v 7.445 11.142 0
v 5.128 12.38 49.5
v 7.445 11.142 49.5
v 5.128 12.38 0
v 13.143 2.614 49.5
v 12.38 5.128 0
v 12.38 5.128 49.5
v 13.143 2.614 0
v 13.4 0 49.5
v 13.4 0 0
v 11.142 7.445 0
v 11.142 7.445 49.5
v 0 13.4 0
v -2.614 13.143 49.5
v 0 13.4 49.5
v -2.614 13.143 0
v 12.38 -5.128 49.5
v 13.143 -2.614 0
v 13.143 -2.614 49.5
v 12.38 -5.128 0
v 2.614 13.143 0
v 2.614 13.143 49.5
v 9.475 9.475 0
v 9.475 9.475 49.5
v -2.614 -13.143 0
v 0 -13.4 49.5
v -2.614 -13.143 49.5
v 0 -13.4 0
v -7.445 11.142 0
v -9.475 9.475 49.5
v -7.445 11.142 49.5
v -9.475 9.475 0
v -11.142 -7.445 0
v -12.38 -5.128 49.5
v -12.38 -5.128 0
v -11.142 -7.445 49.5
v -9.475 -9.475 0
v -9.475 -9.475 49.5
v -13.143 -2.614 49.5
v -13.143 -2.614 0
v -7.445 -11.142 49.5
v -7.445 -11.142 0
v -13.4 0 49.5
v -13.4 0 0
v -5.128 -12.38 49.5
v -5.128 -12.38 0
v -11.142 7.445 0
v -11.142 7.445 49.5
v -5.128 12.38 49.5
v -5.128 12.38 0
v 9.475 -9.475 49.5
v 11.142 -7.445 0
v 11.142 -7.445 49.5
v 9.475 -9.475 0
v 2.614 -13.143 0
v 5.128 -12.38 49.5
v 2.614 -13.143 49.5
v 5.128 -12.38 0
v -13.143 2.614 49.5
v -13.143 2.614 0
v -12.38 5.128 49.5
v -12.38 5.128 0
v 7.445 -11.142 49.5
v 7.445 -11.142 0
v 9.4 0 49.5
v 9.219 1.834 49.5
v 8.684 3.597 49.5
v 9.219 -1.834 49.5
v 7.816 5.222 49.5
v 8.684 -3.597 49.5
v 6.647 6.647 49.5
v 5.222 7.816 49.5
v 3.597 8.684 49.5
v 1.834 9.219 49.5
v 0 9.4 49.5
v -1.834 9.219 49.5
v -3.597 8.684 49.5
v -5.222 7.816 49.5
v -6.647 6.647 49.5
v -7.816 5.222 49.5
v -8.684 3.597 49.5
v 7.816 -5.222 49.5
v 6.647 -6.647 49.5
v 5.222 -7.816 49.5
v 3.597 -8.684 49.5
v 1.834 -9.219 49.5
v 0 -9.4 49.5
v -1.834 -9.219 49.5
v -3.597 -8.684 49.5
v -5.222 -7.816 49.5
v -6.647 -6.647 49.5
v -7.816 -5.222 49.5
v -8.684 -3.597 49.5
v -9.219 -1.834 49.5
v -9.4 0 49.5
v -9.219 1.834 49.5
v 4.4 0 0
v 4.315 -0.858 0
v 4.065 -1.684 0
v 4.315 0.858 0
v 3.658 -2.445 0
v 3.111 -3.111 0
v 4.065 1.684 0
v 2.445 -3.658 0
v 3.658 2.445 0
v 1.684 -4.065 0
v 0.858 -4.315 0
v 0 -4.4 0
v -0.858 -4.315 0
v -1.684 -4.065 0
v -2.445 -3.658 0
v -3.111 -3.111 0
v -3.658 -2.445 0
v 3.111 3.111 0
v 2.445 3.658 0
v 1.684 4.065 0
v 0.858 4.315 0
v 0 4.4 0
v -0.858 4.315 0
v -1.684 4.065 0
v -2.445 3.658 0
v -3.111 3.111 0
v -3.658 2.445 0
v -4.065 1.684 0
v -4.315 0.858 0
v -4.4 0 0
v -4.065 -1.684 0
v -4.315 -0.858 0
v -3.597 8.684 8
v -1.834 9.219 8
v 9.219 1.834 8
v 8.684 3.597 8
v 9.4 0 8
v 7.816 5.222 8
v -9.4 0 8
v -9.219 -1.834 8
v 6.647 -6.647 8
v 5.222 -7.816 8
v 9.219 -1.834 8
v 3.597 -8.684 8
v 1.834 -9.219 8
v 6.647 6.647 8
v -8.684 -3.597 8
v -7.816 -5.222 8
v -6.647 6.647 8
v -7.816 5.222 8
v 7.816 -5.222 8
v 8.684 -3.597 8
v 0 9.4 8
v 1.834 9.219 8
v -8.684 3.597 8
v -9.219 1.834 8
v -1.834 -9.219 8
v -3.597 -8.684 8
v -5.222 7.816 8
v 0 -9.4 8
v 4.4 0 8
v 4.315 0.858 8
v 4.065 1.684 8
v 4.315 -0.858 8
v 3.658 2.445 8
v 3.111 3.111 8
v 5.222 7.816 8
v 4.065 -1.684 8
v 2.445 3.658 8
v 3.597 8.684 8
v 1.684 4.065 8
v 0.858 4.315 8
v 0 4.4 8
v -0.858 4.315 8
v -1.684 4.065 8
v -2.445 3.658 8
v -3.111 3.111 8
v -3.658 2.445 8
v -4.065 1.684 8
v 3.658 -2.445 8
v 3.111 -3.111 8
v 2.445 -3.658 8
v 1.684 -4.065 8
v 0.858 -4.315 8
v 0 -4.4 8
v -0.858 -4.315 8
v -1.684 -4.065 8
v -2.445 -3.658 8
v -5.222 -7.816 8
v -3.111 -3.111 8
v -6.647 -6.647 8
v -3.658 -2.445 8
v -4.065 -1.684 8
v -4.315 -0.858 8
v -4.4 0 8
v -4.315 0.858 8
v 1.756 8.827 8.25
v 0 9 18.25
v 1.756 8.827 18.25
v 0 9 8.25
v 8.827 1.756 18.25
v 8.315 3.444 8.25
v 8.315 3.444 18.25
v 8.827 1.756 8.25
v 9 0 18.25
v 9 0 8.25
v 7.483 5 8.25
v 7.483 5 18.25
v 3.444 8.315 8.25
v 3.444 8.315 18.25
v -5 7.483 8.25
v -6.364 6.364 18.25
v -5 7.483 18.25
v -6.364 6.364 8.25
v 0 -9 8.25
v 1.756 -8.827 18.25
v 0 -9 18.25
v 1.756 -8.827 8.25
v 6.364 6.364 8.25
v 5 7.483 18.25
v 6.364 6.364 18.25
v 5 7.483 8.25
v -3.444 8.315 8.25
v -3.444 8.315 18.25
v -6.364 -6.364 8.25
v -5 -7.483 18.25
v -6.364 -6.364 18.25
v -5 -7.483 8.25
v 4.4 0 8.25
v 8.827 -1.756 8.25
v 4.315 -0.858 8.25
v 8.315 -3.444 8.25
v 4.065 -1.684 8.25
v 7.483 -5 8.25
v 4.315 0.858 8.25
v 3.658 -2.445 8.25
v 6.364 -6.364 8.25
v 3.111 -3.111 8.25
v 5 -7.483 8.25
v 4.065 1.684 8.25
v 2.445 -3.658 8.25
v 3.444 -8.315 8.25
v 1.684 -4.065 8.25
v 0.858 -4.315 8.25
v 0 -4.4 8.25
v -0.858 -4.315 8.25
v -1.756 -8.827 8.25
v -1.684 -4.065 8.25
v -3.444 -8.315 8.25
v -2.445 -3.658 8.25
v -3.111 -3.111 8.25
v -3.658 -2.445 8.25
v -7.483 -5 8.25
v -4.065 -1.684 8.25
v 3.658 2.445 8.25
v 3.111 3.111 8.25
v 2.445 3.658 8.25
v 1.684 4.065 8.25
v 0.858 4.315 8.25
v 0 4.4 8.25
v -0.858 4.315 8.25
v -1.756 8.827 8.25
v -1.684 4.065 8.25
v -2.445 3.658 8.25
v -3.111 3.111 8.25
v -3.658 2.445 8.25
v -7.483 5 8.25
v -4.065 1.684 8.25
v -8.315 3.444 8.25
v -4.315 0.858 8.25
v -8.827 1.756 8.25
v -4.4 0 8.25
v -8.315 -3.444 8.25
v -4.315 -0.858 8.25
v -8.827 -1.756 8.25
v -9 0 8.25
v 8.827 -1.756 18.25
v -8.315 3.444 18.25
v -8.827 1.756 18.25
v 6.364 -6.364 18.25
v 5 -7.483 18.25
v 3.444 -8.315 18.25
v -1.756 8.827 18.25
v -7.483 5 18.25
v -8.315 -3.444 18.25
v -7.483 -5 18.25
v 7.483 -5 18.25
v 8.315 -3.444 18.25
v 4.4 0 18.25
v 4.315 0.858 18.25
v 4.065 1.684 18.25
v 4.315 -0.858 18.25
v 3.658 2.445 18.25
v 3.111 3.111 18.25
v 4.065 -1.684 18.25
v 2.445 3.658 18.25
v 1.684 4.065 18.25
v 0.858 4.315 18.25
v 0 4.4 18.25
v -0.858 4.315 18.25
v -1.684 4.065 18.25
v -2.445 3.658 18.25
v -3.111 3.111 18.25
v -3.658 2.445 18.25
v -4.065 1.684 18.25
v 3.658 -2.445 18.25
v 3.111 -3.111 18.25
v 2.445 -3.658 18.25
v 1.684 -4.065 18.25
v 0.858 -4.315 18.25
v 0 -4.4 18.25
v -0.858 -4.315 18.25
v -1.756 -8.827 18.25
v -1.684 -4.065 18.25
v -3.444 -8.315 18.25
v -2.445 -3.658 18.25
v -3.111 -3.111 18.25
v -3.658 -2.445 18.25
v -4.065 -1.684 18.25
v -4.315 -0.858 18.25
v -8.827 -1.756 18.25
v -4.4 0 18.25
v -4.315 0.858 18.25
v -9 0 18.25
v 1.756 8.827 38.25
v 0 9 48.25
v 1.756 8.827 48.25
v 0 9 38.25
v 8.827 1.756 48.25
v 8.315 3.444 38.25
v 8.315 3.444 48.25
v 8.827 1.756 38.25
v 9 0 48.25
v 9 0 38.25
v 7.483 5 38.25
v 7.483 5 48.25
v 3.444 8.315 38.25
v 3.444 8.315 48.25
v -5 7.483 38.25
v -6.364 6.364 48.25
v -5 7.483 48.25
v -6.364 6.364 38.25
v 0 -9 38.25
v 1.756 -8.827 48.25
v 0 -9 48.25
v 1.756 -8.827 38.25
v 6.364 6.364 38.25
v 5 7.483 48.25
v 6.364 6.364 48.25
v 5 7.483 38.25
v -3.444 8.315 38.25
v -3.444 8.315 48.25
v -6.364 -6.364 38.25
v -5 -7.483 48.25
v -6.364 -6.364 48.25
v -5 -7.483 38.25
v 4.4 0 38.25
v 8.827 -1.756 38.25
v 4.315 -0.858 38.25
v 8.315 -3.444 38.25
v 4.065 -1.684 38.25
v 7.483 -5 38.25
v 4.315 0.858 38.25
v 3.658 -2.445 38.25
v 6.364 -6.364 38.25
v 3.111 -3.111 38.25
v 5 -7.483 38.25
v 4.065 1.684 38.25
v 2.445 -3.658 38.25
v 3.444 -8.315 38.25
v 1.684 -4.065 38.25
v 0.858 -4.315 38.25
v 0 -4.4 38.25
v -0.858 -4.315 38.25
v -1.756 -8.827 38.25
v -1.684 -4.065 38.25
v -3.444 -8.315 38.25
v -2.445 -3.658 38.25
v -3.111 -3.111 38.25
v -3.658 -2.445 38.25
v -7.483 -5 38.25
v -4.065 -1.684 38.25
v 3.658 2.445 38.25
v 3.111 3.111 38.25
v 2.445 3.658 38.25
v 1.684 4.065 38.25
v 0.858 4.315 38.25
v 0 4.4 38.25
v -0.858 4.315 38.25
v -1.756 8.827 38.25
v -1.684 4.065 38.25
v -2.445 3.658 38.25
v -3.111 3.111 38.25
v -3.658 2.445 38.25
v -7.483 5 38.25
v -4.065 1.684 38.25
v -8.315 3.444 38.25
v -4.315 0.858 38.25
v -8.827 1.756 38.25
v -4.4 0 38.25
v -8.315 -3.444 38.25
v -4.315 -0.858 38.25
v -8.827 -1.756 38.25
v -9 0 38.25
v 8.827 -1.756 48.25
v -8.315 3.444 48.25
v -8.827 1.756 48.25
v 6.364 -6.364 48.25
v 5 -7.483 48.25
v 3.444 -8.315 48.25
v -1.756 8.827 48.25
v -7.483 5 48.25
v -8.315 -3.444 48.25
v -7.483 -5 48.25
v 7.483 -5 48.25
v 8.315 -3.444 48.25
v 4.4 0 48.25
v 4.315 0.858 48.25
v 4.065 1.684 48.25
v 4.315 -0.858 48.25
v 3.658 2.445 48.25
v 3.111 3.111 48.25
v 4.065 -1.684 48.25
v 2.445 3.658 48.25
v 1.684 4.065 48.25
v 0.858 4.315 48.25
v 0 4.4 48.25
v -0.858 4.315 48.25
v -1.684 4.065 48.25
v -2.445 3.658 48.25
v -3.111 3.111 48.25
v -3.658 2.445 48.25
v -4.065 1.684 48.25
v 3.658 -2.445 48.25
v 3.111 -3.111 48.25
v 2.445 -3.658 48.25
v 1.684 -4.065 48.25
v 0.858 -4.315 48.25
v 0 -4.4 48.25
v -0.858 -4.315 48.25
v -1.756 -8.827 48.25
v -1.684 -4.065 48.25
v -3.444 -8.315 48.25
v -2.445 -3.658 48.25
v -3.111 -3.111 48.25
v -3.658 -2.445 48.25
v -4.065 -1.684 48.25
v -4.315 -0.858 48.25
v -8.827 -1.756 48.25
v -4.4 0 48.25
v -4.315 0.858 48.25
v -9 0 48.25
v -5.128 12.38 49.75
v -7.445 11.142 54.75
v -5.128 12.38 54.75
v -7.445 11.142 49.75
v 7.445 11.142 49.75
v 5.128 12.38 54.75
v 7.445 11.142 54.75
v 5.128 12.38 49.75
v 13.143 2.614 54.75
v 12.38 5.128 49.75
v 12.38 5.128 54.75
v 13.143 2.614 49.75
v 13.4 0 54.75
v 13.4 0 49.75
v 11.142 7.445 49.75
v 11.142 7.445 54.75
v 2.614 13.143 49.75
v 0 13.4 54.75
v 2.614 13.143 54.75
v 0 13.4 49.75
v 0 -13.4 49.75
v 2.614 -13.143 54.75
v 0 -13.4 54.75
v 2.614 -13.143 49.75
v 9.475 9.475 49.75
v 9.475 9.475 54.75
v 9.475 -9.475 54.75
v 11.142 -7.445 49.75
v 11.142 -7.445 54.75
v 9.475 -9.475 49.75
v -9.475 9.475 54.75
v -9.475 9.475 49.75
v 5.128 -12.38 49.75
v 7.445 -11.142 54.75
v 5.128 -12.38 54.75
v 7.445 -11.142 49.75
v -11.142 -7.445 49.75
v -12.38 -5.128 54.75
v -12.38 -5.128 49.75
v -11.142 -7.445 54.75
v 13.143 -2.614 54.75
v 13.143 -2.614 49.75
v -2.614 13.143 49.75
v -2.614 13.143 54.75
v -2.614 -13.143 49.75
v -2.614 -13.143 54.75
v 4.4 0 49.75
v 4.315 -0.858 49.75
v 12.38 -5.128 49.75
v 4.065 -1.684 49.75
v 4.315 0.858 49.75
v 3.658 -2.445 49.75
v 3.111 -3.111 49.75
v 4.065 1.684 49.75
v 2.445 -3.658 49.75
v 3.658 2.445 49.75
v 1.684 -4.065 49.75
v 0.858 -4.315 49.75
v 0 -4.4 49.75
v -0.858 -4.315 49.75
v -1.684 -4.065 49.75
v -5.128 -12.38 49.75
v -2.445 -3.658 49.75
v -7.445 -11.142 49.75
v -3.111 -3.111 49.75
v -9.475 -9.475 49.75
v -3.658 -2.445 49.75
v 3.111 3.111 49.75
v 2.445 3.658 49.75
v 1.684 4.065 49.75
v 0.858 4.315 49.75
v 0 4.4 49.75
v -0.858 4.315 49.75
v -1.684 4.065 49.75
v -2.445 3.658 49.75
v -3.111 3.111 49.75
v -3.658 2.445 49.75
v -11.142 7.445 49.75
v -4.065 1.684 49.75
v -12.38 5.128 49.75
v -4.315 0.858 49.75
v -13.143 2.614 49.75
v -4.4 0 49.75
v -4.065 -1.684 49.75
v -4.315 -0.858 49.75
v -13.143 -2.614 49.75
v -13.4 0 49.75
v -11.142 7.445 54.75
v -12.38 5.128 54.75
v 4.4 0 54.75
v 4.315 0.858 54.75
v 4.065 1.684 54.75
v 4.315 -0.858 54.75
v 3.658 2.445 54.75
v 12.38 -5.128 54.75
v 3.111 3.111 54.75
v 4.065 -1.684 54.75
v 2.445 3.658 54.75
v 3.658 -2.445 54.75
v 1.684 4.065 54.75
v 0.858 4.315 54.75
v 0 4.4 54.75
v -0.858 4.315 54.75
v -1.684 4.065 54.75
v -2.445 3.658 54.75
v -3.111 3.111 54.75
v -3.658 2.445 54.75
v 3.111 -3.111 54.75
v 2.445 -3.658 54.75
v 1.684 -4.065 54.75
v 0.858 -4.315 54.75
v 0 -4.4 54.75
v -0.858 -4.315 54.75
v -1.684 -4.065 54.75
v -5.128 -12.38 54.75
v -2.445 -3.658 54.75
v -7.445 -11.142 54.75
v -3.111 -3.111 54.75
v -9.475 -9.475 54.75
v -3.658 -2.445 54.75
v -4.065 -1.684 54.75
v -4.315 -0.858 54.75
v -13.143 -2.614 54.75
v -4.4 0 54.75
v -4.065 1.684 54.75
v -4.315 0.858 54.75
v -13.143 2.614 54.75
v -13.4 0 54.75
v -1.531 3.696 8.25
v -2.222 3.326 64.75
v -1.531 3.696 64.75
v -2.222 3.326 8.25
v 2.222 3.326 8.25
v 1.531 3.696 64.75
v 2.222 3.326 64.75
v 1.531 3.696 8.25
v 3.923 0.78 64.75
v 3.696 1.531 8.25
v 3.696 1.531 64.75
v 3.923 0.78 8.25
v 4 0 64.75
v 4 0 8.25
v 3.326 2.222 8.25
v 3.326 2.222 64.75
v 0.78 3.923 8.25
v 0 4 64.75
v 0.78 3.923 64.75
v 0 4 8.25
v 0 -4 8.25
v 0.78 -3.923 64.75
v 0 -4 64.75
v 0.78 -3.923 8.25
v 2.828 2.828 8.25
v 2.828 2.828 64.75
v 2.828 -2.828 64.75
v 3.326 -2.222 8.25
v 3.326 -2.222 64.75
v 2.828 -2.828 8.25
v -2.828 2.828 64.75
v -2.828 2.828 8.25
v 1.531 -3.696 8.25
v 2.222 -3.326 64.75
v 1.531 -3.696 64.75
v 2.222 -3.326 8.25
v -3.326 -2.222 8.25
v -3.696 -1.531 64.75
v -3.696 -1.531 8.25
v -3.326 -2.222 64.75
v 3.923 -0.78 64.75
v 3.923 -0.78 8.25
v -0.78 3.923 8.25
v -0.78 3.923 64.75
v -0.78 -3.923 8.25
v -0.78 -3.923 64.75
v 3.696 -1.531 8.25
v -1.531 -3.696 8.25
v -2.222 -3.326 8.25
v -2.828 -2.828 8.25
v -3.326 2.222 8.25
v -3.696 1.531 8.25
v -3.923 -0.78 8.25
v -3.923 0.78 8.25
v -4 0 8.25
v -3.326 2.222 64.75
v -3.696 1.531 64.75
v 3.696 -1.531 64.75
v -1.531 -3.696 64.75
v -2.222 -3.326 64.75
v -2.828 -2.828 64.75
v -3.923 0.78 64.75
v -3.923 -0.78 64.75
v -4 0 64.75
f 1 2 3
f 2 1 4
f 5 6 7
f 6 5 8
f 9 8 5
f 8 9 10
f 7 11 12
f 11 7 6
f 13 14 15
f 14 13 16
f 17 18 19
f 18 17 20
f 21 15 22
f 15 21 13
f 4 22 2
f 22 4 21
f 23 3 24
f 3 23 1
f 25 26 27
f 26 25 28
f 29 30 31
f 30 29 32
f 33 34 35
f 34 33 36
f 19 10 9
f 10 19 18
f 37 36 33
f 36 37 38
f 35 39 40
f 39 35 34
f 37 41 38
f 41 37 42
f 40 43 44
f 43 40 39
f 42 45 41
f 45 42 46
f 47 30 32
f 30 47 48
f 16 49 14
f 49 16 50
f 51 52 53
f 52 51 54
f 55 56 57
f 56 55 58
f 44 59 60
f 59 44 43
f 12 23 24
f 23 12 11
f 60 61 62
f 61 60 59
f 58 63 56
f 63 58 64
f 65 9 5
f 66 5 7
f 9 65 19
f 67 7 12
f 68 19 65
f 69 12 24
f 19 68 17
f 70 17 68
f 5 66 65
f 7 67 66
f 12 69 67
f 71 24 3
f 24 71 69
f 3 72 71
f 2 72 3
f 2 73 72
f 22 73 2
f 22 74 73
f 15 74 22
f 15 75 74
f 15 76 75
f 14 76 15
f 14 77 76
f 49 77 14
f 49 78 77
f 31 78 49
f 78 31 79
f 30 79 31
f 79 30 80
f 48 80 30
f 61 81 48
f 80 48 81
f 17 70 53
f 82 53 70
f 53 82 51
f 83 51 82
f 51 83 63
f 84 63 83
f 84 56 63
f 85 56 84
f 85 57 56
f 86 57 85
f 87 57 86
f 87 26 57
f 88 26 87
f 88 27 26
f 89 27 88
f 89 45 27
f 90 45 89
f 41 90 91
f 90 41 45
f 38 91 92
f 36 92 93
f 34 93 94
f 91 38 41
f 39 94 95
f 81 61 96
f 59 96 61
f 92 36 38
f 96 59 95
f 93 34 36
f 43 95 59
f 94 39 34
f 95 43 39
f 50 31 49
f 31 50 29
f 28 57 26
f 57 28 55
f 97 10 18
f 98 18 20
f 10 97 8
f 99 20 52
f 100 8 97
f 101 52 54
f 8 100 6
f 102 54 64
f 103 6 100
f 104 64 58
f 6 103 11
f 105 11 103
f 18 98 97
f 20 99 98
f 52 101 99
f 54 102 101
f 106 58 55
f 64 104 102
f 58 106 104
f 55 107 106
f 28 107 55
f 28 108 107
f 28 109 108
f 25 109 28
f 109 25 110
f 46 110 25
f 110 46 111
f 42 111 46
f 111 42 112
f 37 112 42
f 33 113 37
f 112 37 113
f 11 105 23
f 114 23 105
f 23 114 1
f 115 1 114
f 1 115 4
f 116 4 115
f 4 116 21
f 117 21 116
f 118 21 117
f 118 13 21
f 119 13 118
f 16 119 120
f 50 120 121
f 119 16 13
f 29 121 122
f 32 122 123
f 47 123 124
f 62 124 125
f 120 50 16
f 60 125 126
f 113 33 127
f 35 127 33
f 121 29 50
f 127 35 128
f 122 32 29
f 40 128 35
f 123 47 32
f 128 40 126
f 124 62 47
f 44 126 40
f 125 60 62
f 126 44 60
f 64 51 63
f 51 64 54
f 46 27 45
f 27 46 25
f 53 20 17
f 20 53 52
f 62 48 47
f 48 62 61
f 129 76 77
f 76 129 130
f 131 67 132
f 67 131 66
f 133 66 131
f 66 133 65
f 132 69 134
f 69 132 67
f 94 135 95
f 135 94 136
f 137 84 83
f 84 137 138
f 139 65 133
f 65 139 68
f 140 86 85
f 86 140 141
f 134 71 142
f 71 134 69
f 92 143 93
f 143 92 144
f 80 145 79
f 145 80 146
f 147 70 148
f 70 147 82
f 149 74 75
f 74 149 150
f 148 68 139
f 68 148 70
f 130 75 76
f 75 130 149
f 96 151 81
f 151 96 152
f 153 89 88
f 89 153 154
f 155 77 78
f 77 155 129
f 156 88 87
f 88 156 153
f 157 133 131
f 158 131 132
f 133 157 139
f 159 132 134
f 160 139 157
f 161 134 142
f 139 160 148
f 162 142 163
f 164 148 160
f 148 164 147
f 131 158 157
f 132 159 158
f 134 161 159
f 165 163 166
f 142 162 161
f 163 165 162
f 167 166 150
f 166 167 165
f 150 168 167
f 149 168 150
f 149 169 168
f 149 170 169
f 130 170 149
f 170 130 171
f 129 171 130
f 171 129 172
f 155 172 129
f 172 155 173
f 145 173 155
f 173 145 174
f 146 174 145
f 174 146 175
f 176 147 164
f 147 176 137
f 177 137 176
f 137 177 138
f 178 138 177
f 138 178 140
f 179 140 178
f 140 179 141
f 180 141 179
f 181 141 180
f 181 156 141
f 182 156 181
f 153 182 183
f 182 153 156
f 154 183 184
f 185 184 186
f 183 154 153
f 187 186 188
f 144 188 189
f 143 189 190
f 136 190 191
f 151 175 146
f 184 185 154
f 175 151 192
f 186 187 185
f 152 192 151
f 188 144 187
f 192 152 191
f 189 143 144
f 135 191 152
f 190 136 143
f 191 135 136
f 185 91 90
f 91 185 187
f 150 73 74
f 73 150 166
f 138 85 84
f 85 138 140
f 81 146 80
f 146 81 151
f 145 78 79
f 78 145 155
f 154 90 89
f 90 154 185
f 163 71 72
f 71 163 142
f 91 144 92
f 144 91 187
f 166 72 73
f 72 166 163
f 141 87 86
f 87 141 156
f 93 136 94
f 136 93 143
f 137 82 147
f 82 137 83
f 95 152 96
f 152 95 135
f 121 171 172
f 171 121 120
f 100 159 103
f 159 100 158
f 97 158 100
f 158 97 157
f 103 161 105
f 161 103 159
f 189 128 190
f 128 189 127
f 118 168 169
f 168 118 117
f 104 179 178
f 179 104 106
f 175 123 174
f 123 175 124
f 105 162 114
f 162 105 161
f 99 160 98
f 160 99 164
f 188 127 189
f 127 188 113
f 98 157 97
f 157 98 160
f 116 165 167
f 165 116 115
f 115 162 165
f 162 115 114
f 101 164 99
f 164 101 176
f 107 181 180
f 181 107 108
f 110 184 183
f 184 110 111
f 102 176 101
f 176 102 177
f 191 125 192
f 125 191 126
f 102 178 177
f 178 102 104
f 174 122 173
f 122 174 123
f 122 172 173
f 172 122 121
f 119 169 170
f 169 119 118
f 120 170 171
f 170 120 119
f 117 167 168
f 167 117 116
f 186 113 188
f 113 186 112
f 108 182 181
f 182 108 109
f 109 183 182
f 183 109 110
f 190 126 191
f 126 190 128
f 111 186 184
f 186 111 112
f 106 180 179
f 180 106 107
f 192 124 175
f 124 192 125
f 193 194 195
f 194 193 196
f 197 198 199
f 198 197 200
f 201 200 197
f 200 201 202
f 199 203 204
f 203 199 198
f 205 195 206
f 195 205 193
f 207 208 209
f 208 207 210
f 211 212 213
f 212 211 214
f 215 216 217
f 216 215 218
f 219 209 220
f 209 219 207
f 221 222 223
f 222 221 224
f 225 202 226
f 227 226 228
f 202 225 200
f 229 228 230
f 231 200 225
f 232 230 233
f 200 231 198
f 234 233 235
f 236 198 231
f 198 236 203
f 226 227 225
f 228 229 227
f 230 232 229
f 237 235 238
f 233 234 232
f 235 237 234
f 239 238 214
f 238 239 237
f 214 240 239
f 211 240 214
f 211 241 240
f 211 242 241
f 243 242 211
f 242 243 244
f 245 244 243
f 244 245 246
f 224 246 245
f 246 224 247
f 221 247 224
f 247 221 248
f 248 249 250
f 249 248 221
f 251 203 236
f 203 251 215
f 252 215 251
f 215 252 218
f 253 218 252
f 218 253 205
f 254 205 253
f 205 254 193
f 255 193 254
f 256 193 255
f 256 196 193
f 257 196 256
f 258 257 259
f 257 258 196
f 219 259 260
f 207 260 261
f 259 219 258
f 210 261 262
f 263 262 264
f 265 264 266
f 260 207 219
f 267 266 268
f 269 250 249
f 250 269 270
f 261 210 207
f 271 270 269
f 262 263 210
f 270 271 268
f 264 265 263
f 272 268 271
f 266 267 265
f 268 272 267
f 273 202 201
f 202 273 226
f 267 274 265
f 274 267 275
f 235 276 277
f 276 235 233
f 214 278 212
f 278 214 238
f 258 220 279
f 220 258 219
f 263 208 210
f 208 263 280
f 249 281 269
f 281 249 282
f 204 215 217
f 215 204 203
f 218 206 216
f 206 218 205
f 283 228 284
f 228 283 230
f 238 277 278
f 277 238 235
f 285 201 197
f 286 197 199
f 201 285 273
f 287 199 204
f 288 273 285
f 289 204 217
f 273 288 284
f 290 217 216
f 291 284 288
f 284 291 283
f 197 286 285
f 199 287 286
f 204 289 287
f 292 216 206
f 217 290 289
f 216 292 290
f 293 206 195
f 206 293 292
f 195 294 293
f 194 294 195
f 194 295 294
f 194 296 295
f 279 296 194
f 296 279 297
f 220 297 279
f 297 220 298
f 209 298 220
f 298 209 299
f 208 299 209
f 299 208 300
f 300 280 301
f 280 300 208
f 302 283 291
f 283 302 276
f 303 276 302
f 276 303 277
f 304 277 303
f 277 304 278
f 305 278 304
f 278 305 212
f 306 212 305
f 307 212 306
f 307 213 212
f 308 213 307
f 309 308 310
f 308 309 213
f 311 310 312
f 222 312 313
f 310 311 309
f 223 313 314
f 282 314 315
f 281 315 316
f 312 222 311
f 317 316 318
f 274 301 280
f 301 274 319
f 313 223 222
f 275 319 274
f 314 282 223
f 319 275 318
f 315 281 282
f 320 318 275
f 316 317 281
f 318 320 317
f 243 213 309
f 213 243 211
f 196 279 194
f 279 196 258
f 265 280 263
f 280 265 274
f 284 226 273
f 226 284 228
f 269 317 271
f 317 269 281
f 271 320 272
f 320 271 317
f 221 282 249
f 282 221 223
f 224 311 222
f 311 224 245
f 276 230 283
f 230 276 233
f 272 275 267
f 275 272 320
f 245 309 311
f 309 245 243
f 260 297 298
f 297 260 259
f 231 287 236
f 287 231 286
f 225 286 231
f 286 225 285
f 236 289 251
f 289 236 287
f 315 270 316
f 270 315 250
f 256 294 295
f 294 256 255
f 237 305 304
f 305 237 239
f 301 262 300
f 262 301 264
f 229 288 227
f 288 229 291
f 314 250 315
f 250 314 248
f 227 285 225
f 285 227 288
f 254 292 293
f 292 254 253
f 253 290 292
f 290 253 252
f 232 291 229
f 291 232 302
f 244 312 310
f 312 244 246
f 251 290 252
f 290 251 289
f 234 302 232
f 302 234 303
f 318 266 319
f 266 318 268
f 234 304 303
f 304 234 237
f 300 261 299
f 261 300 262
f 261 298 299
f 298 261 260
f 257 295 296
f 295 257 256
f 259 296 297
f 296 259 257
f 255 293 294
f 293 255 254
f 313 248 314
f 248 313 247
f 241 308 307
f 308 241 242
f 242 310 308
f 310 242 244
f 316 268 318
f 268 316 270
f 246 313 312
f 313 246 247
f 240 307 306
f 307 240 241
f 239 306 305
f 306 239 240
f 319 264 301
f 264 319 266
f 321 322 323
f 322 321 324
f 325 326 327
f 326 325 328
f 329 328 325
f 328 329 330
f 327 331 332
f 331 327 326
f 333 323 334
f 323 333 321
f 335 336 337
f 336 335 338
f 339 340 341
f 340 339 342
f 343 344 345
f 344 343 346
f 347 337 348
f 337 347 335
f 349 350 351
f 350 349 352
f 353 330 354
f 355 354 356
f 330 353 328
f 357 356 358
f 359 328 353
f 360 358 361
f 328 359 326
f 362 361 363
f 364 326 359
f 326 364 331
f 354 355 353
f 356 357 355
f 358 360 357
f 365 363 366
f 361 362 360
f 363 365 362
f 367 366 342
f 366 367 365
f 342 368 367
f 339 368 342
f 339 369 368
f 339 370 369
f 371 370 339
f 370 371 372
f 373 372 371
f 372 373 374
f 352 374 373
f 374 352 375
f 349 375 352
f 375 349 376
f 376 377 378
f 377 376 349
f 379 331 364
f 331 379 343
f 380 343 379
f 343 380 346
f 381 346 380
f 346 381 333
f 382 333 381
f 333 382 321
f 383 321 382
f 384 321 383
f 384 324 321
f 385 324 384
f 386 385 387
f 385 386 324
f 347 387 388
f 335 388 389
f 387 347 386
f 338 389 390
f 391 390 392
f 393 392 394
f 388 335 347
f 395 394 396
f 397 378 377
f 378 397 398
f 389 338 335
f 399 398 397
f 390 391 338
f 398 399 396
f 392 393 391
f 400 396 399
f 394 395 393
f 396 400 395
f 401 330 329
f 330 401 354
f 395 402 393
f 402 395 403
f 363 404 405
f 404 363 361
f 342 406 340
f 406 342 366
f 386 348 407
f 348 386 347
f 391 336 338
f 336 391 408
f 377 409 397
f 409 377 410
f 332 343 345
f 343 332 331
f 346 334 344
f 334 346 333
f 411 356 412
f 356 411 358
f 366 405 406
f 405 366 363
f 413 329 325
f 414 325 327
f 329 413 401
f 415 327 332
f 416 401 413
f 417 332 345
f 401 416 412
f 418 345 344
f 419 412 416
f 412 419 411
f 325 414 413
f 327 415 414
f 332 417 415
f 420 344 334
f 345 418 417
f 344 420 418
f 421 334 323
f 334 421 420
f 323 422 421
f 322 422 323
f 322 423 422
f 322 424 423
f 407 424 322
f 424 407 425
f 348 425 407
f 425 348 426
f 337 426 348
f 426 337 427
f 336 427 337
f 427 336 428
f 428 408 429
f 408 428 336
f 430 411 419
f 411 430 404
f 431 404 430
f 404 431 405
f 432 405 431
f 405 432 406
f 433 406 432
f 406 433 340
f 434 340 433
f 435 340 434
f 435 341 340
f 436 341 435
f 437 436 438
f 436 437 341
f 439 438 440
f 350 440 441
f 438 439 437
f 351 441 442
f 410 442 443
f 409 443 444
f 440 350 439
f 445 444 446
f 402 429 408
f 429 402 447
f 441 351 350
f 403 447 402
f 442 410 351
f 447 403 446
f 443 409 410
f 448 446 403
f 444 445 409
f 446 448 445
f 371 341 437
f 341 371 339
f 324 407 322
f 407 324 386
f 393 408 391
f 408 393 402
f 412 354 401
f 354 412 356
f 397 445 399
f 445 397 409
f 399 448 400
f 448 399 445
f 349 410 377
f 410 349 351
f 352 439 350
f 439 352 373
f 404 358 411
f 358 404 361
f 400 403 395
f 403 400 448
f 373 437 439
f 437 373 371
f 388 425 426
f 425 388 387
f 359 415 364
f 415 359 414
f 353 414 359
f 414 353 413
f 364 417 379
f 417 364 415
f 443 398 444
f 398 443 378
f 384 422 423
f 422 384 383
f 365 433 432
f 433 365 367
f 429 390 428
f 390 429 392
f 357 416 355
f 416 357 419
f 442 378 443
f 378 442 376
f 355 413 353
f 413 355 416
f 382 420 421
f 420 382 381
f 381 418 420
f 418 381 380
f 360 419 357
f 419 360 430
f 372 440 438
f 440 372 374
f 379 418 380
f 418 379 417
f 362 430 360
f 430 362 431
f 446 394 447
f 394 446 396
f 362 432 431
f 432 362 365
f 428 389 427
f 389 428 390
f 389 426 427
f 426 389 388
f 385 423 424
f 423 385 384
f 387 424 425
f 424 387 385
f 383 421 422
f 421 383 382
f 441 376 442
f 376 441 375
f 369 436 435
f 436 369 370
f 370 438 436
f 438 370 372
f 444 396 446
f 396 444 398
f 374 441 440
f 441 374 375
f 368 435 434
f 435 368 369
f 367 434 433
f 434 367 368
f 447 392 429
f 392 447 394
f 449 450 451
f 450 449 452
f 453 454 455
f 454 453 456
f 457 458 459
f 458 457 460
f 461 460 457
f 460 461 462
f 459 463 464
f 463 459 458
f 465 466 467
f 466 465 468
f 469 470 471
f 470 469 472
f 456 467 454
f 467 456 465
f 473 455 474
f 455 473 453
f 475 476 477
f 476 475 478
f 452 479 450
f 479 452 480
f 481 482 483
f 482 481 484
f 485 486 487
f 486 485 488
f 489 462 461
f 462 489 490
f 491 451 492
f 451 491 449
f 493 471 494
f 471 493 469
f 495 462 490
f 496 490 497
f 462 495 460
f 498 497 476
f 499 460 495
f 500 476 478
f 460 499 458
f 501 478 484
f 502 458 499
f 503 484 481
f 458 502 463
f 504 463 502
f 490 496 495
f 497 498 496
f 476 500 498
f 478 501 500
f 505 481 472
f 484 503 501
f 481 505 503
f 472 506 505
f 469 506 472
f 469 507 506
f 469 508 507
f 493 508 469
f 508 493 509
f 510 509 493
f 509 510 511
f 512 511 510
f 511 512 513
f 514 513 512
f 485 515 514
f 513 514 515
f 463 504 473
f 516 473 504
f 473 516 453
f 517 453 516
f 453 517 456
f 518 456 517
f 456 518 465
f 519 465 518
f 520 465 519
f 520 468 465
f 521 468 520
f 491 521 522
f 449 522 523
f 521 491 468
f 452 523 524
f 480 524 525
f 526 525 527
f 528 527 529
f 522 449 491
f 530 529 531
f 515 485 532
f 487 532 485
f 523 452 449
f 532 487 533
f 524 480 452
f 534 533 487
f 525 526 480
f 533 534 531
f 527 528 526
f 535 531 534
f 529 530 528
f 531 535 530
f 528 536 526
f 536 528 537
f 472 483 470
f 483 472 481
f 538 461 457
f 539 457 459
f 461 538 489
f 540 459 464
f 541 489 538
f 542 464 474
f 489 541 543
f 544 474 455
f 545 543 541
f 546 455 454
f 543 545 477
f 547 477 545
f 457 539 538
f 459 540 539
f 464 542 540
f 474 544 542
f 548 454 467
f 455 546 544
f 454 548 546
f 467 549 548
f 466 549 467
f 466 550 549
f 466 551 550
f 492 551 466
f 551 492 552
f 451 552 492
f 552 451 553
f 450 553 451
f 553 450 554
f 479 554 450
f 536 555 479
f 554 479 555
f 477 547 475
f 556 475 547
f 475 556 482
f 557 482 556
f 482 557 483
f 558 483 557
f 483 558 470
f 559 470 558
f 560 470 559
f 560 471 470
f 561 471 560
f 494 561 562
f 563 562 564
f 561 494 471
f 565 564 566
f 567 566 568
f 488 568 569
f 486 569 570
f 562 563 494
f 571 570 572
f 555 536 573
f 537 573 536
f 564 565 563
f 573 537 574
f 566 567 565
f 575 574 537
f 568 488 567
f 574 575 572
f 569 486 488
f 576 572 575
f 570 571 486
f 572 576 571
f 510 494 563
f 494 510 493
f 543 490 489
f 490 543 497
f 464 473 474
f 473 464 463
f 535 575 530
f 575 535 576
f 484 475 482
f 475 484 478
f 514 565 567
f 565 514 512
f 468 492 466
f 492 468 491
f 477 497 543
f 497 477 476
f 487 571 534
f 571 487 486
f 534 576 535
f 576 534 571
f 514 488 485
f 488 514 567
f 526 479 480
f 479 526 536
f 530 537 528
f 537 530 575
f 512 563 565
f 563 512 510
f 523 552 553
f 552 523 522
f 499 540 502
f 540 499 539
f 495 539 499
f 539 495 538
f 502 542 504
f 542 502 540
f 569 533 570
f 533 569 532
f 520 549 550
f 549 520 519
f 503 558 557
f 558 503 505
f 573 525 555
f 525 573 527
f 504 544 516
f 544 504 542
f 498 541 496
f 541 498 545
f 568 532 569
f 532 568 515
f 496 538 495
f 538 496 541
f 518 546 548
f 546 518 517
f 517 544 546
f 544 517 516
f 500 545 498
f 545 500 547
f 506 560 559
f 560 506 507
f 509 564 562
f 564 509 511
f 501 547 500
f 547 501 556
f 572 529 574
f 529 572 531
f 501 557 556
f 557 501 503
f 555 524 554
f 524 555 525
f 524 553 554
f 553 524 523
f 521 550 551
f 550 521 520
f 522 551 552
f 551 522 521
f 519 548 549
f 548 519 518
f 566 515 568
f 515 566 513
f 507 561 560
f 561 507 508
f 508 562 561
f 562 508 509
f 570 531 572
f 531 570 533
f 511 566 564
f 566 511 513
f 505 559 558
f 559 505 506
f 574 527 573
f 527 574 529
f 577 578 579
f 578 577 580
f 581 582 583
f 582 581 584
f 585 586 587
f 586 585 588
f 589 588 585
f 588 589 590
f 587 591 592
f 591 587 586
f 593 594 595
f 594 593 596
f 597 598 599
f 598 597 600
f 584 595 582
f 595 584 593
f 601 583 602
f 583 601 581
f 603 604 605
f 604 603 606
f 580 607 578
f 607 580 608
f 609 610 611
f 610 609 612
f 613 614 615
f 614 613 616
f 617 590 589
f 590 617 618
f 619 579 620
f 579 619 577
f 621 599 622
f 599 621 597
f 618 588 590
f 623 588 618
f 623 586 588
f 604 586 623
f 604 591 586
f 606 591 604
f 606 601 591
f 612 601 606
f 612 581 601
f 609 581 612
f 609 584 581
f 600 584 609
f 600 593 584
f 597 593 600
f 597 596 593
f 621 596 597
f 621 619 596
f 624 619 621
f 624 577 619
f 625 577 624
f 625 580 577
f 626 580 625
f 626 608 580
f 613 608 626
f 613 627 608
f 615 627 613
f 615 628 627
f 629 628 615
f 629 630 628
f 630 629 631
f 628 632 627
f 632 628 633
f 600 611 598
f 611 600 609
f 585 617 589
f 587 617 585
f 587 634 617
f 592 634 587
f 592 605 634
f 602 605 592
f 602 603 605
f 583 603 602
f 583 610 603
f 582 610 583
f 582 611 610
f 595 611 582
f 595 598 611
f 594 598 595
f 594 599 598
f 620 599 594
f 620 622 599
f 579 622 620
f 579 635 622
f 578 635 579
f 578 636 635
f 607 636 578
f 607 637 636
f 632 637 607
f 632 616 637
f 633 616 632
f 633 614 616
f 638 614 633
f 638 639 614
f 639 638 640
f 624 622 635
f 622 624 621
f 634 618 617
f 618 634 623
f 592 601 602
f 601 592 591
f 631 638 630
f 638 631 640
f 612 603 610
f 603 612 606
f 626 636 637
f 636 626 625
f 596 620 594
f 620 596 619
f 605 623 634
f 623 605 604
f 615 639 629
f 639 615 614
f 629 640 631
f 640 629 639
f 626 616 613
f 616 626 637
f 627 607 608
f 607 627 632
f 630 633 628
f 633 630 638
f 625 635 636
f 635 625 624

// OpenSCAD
$fn = 32;

// ------------------------------------------------------------------------
// Shaft station: cup d26.8 x 49.5 mm, shaft d8
// Every part is its own module, assembly() places every instance.
// ------------------------------------------------------------------------

// --- part 1 ---
module housing_cup() {
  difference() {
    cylinder(h = 49.5, d = 26.8);
    translate([0, 0, 8]) cylinder(h = 42.5, d = 18.8);
    translate([0, 0, -1]) cylinder(h = 10, d = 8.8);
  }
}

// --- part 2 ---
module bearing_lower() {
  difference() {
      translate([0, 0, 0]) cylinder(h = 10, d = 18);
      translate([0, 0, -1]) cylinder(h = 12, d = 8.8);
    }
}

// --- part 3 ---
module bearing_upper() {
  difference() {
      translate([0, 0, 0]) cylinder(h = 10, d = 18);
      translate([0, 0, -1]) cylinder(h = 12, d = 8.8);
    }
}

// --- part 4 ---
module station_shaft() {
  translate([0, 0, -28.25]) cylinder(h = 56.5, d = 8);
}

// --- part 5 ---
module station_cover() {
  difference() {
    cylinder(h = 5, d = 26.8);
    translate([0, 0, -1]) cylinder(h = 7, d = 8.8);
  }
}

// --- assembly ---
module assembly() {
  color([0.80, 0.24, 0.20]) translate([0, 0, 0]) rotate([0, 0, 0]) housing_cup();
  color([0.20, 0.45, 0.75]) translate([0, 0, 8.25]) rotate([0, 0, 0]) bearing_lower();
  color([0.25, 0.62, 0.32]) translate([0, 0, 38.25]) rotate([0, 0, 0]) bearing_upper();
  color([0.92, 0.70, 0.18]) translate([0, 0, 36.5]) rotate([0, 0, 0]) station_shaft();
  color([0.58, 0.35, 0.70]) translate([0, 0, 49.75]) rotate([0, 0, 0]) station_cover();
}

assembly();
